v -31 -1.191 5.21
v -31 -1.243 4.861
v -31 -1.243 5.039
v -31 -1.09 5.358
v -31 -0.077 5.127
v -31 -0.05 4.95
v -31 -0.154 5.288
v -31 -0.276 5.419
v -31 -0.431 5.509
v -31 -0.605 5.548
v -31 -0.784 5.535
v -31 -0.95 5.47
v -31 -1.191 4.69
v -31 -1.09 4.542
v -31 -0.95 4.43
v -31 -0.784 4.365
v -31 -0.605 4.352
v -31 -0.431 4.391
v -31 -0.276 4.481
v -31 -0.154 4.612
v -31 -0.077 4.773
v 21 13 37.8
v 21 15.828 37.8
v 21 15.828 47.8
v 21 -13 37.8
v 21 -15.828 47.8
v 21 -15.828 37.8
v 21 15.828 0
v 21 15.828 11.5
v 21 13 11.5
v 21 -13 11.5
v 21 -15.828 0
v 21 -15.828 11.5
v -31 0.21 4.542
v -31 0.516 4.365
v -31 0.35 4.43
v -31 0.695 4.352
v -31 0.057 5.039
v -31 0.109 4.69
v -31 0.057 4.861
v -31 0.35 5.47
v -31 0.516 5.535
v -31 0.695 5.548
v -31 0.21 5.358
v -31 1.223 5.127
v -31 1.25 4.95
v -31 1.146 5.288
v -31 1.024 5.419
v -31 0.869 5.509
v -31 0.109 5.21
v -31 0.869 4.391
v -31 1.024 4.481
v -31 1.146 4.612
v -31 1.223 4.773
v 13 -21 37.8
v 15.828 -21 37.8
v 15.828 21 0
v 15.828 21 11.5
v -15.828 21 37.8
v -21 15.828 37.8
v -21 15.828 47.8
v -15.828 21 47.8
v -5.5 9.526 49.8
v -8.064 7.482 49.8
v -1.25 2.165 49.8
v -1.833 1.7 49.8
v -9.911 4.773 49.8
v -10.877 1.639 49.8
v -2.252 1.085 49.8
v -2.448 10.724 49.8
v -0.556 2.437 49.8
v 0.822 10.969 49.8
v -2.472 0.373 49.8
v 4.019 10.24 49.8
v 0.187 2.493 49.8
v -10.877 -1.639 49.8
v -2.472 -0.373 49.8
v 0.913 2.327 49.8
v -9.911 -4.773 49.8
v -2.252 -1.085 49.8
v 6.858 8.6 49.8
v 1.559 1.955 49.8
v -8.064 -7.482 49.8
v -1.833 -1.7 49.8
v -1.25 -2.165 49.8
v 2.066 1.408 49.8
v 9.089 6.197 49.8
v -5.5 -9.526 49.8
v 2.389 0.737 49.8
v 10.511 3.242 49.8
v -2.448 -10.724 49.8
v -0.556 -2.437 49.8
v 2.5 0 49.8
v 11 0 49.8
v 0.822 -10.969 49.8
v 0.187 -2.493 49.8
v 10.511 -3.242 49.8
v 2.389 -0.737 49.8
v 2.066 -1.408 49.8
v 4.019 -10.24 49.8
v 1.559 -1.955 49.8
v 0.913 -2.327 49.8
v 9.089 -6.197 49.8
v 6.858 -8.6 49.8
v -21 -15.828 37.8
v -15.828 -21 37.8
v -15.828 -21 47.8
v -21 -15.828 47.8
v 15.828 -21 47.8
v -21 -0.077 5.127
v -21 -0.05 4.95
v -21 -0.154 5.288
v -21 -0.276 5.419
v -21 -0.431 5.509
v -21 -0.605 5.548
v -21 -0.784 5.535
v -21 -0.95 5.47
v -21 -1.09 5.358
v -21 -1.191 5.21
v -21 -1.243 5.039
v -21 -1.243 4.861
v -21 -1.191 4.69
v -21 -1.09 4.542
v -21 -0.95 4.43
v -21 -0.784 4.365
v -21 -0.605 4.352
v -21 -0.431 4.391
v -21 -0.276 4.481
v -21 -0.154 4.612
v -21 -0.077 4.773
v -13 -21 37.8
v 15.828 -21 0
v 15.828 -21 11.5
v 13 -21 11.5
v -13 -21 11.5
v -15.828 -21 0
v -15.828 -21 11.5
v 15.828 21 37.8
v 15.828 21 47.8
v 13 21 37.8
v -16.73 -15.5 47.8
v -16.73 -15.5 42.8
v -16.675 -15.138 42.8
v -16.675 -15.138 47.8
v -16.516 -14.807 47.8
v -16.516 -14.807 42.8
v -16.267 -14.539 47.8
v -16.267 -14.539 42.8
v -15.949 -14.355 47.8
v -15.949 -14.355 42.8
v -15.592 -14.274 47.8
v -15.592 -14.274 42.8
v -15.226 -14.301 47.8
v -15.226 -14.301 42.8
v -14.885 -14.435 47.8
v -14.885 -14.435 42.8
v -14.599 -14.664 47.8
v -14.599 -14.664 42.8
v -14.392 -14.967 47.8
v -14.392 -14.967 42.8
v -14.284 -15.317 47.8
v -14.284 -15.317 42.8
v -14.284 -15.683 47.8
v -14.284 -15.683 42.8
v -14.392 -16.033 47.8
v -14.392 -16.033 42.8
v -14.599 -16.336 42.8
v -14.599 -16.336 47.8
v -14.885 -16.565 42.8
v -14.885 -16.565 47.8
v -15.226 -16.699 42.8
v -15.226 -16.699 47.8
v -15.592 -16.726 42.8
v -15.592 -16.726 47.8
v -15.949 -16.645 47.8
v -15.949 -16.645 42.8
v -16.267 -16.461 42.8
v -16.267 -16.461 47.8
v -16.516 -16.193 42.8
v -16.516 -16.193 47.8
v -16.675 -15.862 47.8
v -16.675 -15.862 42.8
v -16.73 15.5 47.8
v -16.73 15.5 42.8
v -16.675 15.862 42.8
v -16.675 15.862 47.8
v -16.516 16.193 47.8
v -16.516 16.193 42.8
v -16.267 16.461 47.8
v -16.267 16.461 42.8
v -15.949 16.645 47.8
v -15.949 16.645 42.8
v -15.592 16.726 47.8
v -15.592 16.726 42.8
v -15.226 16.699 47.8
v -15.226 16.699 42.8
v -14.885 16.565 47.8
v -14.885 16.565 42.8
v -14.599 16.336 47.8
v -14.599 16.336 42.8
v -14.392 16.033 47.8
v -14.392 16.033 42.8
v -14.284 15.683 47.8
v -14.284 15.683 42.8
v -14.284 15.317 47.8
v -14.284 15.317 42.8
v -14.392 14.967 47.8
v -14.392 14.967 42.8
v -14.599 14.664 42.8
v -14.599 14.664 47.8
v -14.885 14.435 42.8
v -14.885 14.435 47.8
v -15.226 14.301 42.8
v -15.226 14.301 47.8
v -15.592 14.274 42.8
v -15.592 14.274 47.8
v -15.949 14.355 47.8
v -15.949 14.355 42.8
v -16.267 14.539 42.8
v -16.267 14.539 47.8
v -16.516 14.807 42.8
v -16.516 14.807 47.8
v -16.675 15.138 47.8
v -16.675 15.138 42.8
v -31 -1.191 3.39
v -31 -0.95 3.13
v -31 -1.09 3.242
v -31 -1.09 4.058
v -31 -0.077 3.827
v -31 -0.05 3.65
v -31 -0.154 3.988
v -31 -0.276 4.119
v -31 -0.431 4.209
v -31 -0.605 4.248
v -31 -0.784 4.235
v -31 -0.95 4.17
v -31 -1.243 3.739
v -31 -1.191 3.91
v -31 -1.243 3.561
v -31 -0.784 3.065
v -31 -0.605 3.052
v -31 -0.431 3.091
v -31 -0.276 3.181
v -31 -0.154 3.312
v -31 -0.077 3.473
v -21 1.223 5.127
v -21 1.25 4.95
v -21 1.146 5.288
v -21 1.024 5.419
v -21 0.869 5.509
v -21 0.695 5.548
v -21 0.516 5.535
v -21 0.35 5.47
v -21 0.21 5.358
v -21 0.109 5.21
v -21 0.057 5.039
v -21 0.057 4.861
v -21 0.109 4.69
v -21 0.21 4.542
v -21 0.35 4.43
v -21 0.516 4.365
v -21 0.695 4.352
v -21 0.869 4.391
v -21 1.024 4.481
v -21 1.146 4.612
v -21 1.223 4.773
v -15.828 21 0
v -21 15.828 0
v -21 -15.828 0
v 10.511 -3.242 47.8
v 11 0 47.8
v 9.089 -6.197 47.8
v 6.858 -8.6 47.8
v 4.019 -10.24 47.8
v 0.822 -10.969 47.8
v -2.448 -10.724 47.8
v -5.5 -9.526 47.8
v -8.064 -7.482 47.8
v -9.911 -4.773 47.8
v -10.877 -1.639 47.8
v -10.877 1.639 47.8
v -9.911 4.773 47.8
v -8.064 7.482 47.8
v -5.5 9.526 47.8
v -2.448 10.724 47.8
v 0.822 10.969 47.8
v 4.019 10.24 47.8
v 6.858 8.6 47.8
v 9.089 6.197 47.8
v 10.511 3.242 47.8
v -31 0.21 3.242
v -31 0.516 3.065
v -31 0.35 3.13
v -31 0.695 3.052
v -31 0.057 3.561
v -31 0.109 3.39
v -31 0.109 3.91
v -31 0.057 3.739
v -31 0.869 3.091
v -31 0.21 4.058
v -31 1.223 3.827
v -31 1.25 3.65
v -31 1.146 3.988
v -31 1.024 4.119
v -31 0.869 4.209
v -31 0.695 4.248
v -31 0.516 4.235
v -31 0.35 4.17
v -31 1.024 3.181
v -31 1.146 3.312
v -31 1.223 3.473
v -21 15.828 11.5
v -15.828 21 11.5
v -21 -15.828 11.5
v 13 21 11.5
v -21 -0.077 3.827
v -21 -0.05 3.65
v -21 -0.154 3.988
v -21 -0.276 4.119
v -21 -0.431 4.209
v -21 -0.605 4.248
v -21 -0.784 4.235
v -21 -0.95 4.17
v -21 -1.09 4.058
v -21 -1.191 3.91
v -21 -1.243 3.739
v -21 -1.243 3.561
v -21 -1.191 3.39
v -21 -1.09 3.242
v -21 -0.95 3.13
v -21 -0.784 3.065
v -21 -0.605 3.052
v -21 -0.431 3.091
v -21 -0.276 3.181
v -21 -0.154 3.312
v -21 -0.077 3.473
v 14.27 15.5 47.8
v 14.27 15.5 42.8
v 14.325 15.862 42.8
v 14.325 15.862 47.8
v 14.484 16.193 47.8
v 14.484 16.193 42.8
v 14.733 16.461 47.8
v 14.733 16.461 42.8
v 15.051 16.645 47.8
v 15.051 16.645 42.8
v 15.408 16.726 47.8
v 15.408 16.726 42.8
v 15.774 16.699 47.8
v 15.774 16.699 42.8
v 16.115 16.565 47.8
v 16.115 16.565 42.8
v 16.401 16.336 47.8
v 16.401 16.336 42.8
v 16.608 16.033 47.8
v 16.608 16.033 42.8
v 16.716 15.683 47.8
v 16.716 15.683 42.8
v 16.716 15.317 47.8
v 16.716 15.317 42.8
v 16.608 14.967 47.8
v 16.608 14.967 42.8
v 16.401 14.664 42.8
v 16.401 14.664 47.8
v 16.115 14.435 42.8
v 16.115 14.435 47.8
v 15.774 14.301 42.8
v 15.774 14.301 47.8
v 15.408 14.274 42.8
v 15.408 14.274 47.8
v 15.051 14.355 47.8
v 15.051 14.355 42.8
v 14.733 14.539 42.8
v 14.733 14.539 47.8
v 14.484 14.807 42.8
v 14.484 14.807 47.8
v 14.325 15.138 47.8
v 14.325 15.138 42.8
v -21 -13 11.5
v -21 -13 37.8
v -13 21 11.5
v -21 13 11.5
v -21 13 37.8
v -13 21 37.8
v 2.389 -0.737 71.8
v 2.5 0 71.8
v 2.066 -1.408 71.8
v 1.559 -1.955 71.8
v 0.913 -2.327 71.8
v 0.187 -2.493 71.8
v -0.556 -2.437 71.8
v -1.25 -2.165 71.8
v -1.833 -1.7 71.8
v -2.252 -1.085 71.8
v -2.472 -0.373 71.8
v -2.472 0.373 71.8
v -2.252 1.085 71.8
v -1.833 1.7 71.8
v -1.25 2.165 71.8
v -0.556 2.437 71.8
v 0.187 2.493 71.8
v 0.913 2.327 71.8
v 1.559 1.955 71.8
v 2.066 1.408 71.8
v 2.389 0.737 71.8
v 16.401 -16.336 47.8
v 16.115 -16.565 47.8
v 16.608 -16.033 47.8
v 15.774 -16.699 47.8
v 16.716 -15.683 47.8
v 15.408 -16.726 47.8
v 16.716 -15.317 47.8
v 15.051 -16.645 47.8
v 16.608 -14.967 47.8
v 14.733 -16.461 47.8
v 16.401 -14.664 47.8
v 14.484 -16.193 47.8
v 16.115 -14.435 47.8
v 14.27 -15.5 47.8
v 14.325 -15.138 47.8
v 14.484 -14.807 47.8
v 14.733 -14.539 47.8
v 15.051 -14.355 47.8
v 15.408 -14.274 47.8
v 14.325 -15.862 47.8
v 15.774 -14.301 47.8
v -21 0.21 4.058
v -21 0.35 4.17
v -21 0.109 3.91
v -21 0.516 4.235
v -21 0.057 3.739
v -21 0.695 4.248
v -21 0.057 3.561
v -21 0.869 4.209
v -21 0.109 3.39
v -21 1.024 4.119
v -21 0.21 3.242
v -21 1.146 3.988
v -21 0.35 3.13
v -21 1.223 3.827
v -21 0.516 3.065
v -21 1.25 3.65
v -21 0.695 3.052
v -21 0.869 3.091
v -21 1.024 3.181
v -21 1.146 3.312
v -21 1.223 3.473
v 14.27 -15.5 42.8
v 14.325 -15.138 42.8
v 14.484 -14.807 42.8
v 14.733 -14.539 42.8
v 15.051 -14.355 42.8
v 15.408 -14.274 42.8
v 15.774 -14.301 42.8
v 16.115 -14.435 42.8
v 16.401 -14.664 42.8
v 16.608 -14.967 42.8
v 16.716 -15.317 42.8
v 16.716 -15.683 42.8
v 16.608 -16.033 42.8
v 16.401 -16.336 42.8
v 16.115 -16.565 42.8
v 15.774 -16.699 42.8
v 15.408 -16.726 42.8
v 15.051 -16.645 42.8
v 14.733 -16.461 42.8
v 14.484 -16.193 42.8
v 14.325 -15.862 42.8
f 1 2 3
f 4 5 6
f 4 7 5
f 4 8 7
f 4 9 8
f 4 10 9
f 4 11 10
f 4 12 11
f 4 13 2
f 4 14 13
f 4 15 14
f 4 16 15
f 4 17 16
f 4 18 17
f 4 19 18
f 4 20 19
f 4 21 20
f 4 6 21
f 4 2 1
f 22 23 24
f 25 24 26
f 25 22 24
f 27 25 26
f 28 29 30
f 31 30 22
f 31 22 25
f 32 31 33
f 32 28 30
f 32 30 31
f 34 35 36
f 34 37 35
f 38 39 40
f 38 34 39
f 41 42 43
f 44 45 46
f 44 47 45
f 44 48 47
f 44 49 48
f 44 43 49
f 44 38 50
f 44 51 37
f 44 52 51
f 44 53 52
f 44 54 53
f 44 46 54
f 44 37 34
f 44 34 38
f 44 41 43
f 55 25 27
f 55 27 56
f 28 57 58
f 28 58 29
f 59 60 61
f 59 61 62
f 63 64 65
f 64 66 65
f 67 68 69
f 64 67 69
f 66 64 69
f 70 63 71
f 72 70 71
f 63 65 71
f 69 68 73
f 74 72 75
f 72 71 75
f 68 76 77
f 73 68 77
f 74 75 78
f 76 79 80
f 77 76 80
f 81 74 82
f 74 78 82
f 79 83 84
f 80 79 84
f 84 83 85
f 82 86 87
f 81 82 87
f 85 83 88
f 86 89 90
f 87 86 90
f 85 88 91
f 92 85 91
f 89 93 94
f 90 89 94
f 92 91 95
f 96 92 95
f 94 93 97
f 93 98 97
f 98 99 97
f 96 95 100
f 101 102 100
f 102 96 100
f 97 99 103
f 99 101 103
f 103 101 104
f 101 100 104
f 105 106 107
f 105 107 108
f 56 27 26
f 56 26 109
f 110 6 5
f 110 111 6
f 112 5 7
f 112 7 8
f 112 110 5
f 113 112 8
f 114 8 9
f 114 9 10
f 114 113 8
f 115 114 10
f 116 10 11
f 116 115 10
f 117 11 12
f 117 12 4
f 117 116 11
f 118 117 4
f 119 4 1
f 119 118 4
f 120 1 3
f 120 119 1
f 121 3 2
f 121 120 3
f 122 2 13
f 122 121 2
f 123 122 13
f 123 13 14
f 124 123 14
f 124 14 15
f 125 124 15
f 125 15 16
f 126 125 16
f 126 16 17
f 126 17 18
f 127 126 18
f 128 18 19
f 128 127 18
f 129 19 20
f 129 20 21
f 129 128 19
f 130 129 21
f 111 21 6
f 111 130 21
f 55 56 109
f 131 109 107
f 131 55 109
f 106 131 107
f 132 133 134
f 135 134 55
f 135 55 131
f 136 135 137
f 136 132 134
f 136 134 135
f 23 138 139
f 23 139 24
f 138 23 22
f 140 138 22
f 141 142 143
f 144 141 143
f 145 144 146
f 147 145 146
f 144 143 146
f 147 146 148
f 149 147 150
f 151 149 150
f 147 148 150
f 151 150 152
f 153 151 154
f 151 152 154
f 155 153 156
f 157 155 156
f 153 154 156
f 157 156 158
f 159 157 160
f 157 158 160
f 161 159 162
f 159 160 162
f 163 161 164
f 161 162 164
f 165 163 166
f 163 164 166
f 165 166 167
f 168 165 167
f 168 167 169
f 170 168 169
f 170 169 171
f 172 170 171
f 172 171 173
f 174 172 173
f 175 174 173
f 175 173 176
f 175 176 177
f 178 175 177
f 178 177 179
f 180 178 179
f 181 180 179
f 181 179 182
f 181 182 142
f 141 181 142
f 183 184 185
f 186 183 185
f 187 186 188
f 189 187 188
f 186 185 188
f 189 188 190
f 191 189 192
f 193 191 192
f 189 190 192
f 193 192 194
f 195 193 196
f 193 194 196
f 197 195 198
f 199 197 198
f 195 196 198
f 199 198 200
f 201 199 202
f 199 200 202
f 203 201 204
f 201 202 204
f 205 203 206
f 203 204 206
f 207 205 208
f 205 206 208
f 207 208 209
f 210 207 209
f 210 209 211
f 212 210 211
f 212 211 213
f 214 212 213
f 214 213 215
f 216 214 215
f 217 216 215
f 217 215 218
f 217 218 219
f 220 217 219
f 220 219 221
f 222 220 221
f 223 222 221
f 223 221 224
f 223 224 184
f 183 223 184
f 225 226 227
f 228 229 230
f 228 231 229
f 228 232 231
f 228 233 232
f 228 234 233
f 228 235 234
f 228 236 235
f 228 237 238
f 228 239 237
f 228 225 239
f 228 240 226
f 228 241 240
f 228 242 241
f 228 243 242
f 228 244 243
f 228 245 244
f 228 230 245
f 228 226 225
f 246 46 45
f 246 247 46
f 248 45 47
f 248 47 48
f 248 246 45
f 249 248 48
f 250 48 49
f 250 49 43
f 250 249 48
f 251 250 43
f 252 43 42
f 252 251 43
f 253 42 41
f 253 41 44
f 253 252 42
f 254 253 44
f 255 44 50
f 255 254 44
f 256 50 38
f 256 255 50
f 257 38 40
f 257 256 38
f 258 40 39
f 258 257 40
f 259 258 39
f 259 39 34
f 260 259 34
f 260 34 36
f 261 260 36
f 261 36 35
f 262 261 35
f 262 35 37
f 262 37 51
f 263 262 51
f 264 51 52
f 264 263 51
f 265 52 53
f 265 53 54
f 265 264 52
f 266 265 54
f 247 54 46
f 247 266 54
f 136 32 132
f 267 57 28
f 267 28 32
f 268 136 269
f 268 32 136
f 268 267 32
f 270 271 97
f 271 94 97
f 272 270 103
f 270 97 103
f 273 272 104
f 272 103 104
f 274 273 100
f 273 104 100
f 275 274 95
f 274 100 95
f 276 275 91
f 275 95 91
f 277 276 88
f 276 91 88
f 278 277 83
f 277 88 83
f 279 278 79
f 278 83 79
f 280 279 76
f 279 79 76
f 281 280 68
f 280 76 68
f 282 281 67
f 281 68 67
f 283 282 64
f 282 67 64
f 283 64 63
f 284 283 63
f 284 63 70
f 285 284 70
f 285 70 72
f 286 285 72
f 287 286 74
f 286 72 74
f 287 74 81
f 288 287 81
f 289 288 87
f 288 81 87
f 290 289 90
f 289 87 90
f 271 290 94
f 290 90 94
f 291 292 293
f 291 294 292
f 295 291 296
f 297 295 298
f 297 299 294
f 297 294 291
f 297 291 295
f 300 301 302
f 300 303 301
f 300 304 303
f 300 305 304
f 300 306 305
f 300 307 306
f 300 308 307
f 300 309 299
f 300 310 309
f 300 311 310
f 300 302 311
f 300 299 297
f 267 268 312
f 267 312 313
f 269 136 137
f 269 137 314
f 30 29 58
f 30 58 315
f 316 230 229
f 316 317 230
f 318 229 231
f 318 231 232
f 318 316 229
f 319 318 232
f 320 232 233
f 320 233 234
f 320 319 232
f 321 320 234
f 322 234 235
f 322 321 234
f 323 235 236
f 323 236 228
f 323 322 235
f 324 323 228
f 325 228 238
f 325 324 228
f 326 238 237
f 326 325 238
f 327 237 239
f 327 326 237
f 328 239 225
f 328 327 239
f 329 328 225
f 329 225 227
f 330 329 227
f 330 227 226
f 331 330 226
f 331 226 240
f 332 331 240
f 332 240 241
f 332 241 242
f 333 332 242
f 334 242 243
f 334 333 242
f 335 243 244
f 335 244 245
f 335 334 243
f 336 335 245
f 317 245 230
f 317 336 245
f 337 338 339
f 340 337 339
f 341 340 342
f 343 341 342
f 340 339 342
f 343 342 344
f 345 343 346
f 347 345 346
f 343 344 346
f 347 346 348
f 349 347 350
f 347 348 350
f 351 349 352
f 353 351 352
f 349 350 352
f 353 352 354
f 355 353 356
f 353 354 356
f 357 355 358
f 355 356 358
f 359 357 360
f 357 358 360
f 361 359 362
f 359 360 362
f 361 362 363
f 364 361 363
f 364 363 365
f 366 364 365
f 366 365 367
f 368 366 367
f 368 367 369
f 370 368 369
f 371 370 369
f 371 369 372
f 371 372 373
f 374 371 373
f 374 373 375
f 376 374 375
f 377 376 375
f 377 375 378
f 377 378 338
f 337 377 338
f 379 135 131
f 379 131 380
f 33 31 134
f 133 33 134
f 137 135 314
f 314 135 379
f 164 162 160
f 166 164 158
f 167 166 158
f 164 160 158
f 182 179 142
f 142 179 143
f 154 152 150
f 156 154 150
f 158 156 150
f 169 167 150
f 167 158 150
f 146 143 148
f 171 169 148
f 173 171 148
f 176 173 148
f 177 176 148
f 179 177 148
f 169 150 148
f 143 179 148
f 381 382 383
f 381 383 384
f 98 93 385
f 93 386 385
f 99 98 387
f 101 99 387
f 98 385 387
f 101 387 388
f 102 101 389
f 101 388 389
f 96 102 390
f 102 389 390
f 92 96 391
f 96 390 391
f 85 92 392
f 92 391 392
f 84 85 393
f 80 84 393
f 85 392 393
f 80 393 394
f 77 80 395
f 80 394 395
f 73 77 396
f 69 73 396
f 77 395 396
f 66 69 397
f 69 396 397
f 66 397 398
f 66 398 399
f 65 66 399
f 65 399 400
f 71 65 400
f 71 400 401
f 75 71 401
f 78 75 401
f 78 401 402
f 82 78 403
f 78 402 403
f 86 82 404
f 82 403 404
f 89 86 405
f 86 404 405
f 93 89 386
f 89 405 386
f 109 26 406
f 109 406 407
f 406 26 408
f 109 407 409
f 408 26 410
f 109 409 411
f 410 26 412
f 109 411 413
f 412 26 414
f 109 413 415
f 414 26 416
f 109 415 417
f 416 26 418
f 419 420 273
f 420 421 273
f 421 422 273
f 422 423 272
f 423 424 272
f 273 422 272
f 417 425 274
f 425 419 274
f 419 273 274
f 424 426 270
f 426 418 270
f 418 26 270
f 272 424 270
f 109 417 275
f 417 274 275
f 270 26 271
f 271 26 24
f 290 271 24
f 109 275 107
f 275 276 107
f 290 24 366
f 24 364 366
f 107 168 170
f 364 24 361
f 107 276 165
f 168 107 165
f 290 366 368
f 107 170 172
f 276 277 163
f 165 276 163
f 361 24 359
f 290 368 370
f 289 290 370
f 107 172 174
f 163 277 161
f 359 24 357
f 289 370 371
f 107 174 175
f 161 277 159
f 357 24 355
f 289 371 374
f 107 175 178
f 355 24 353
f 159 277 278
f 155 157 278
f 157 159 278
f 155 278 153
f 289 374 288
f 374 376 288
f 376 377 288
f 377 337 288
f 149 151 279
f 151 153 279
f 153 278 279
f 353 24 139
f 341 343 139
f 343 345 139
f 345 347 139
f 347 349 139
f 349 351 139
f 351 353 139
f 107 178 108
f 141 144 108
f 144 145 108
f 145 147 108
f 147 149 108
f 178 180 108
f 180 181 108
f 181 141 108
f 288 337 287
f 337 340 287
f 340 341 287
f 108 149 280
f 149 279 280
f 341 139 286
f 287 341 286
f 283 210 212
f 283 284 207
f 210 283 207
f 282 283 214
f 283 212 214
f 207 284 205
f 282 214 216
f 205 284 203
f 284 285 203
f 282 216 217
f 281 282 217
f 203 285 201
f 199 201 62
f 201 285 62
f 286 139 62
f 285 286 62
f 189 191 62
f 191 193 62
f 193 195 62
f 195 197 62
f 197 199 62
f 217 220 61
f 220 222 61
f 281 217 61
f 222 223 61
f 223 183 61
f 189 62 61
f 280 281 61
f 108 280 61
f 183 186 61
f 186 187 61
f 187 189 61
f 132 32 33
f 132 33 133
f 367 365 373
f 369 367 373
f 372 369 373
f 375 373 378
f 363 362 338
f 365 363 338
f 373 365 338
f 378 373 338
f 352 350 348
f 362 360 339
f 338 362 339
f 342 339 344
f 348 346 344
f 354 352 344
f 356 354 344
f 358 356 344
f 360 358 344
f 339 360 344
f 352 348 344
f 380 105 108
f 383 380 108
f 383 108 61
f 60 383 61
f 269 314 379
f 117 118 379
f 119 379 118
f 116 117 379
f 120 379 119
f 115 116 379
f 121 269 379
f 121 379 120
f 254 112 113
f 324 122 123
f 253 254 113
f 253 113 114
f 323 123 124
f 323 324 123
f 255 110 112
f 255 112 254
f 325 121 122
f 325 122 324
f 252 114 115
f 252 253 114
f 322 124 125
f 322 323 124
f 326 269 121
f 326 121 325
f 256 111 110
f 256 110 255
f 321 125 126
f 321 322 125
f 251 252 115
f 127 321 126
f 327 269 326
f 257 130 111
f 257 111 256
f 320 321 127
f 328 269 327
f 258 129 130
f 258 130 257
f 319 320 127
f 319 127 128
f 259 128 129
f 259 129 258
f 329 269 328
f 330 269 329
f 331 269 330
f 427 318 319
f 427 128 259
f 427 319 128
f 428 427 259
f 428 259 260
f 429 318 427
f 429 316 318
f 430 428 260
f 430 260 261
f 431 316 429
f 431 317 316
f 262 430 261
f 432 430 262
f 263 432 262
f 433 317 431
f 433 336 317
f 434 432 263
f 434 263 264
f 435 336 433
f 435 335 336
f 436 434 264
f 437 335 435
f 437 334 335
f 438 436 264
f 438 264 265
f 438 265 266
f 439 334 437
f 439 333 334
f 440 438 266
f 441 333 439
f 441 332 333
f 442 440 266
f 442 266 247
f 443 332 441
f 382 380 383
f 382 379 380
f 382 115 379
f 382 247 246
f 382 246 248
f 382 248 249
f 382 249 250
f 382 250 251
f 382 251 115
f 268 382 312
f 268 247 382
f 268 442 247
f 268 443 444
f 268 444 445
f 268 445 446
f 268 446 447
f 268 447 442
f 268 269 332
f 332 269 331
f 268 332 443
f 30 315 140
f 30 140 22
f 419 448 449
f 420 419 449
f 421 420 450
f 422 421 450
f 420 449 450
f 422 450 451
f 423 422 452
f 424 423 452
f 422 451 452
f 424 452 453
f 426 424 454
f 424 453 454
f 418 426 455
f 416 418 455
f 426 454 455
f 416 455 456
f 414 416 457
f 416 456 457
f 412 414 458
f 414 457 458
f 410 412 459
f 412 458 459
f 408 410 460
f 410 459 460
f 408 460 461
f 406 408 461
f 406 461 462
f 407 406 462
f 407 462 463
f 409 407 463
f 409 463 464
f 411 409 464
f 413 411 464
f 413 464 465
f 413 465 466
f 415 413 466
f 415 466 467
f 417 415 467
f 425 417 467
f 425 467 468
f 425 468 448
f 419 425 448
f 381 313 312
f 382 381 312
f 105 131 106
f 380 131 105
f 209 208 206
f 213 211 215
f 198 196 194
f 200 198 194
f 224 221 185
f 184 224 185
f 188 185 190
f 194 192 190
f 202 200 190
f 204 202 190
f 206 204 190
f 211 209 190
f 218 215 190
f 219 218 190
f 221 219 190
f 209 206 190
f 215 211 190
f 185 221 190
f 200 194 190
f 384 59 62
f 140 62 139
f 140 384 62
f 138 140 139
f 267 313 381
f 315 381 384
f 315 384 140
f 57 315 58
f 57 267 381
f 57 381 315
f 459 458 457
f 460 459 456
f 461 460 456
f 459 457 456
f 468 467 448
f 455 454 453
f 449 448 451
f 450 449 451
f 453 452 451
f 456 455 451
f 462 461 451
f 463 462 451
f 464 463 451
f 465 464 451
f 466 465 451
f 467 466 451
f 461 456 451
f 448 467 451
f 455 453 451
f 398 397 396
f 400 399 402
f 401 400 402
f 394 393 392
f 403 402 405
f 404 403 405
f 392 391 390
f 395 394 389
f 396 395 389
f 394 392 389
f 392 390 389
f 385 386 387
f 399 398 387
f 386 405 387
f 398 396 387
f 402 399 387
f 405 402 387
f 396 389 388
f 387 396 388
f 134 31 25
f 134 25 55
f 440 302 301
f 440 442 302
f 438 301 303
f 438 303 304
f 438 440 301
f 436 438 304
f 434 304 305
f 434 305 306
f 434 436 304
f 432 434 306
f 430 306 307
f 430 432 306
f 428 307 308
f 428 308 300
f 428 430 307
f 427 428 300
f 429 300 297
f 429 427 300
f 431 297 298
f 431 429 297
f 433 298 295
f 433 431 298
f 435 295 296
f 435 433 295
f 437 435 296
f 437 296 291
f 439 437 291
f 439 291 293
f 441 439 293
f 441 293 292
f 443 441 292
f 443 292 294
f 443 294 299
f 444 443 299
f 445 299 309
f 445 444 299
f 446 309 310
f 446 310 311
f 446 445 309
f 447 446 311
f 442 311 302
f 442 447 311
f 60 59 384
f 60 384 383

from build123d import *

# Parameters (mm, degrees)
BOSS_EXTRUDE1_DEPTH = 11.5
BOSS_EXTRUDE2_DEPTH = 26.3
BOSS_EXTRUDE3_DEPTH = 10
SKETCH4_W           = 10
SKETCH4_H           = 0.6
SKETCH5_W           = 10
SKETCH5_H           = 0.6
SKETCH6_W           = 10
SKETCH6_H           = 0.6
SKETCH7_W           = 10
SKETCH7_H           = 0.6
HOLE1_D             = 2.459
HOLE1_DEPTH         = 5
HOLE2_D             = 2.459
HOLE2_DEPTH         = 5
HOLE3_D             = 2.459
HOLE3_DEPTH         = 5
HOLE4_D             = 2.459
HOLE4_DEPTH         = 5


with BuildPart() as part:
    # Sketch1 → Boss-Extrude1 (new body)
    with BuildSketch(Plane(origin=(0, 0, 0), x_dir=(-1, 0, 0), z_dir=(0, 0, -1))):
        Polygon((-15.828427125, 21), (-21, 15.828427125), (-21, -15.828427125), (-15.828427125, -21), (15.828427125, -21), (21, -15.828427125), (21, 15.828427125), (15.828427125, 21), align=None)
    extrude(amount=-BOSS_EXTRUDE1_DEPTH)

    # Sketch2 → Boss-Extrude2 (add)
    with BuildSketch(Plane.XY.offset(11.5)):
        Polygon((13, -21), (-13, -21), (-21, -13), (-21, 13), (-13, 21), (13, 21), (21, 13), (21, -13), align=None)
    extrude(amount=BOSS_EXTRUDE2_DEPTH)

    # Sketch3 → Boss-Extrude3 (add)
    with BuildSketch(Plane.XY.offset(37.8)):
        Polygon((15.828427125, 21), (21, 15.828427125), (21, -15.828427125), (15.828427125, -21), (-15.828427125, -21), (-21, -15.828427125), (-21, 15.828427125), (-15.828427125, 21), align=None)
    extrude(amount=BOSS_EXTRUDE3_DEPTH)

    # Sketch4 → Revolve1 (revolve)
    with BuildSketch(Plane.XY.offset(3.65)):
        with Locations((-26, 0.95)):
            Rectangle(SKETCH4_W, SKETCH4_H)
    revolve(axis=Axis((-31, 0.65, 3.65), (1, 0, 0)))

    # Sketch5 → Revolve2 (revolve)
    with BuildSketch(Plane.XY.offset(3.65)):
        with Locations((-26, -0.35)):
            Rectangle(SKETCH5_W, SKETCH5_H)
    revolve(axis=Axis((-31, -0.65, 3.65), (1, 0, 0)))

    # Sketch6 → Revolve3 (revolve)
    with BuildSketch(Plane.XY.offset(4.95)):
        with Locations((-26, -0.35)):
            Rectangle(SKETCH6_W, SKETCH6_H)
    revolve(axis=Axis((-31, -0.65, 4.95), (1, 0, 0)))

    # Sketch7 → Revolve4 (revolve)
    with BuildSketch(Plane.XY.offset(4.95)):
        with Locations((-26, 0.95)):
            Rectangle(SKETCH7_W, SKETCH7_H)
    revolve(axis=Axis((-31, 0.65, 4.95), (1, 0, 0)))

    # Sketch8 → Revolve5 (revolve)
    with BuildSketch(Plane.XZ):
        Polygon((2.5, 71.8), (0, 71.8), (0, 47.8), (11, 47.8), (11, 49.8), (2.5, 49.8), align=None)
    revolve(axis=Axis((0, 0, 71.8), (0, 0, -1)))

    # Hole1
    with Locations(Plane.XY.offset(47.8)):
        with Locations((-15.5, 15.5)):
            Hole(HOLE1_D / 2, depth=HOLE1_DEPTH)

    # Hole2
    with Locations(Plane.XY.offset(47.8)):
        with Locations((-15.5, -15.5)):
            Hole(HOLE2_D / 2, depth=HOLE2_DEPTH)

    # Hole3
    with Locations(Plane.XY.offset(47.8)):
        with Locations((15.5, 15.5)):
            Hole(HOLE3_D / 2, depth=HOLE3_DEPTH)

    # Hole4
    with Locations(Plane.XY.offset(47.8)):
        with Locations((15.5, -15.5)):
            Hole(HOLE4_D / 2, depth=HOLE4_DEPTH)


solid = part.part
